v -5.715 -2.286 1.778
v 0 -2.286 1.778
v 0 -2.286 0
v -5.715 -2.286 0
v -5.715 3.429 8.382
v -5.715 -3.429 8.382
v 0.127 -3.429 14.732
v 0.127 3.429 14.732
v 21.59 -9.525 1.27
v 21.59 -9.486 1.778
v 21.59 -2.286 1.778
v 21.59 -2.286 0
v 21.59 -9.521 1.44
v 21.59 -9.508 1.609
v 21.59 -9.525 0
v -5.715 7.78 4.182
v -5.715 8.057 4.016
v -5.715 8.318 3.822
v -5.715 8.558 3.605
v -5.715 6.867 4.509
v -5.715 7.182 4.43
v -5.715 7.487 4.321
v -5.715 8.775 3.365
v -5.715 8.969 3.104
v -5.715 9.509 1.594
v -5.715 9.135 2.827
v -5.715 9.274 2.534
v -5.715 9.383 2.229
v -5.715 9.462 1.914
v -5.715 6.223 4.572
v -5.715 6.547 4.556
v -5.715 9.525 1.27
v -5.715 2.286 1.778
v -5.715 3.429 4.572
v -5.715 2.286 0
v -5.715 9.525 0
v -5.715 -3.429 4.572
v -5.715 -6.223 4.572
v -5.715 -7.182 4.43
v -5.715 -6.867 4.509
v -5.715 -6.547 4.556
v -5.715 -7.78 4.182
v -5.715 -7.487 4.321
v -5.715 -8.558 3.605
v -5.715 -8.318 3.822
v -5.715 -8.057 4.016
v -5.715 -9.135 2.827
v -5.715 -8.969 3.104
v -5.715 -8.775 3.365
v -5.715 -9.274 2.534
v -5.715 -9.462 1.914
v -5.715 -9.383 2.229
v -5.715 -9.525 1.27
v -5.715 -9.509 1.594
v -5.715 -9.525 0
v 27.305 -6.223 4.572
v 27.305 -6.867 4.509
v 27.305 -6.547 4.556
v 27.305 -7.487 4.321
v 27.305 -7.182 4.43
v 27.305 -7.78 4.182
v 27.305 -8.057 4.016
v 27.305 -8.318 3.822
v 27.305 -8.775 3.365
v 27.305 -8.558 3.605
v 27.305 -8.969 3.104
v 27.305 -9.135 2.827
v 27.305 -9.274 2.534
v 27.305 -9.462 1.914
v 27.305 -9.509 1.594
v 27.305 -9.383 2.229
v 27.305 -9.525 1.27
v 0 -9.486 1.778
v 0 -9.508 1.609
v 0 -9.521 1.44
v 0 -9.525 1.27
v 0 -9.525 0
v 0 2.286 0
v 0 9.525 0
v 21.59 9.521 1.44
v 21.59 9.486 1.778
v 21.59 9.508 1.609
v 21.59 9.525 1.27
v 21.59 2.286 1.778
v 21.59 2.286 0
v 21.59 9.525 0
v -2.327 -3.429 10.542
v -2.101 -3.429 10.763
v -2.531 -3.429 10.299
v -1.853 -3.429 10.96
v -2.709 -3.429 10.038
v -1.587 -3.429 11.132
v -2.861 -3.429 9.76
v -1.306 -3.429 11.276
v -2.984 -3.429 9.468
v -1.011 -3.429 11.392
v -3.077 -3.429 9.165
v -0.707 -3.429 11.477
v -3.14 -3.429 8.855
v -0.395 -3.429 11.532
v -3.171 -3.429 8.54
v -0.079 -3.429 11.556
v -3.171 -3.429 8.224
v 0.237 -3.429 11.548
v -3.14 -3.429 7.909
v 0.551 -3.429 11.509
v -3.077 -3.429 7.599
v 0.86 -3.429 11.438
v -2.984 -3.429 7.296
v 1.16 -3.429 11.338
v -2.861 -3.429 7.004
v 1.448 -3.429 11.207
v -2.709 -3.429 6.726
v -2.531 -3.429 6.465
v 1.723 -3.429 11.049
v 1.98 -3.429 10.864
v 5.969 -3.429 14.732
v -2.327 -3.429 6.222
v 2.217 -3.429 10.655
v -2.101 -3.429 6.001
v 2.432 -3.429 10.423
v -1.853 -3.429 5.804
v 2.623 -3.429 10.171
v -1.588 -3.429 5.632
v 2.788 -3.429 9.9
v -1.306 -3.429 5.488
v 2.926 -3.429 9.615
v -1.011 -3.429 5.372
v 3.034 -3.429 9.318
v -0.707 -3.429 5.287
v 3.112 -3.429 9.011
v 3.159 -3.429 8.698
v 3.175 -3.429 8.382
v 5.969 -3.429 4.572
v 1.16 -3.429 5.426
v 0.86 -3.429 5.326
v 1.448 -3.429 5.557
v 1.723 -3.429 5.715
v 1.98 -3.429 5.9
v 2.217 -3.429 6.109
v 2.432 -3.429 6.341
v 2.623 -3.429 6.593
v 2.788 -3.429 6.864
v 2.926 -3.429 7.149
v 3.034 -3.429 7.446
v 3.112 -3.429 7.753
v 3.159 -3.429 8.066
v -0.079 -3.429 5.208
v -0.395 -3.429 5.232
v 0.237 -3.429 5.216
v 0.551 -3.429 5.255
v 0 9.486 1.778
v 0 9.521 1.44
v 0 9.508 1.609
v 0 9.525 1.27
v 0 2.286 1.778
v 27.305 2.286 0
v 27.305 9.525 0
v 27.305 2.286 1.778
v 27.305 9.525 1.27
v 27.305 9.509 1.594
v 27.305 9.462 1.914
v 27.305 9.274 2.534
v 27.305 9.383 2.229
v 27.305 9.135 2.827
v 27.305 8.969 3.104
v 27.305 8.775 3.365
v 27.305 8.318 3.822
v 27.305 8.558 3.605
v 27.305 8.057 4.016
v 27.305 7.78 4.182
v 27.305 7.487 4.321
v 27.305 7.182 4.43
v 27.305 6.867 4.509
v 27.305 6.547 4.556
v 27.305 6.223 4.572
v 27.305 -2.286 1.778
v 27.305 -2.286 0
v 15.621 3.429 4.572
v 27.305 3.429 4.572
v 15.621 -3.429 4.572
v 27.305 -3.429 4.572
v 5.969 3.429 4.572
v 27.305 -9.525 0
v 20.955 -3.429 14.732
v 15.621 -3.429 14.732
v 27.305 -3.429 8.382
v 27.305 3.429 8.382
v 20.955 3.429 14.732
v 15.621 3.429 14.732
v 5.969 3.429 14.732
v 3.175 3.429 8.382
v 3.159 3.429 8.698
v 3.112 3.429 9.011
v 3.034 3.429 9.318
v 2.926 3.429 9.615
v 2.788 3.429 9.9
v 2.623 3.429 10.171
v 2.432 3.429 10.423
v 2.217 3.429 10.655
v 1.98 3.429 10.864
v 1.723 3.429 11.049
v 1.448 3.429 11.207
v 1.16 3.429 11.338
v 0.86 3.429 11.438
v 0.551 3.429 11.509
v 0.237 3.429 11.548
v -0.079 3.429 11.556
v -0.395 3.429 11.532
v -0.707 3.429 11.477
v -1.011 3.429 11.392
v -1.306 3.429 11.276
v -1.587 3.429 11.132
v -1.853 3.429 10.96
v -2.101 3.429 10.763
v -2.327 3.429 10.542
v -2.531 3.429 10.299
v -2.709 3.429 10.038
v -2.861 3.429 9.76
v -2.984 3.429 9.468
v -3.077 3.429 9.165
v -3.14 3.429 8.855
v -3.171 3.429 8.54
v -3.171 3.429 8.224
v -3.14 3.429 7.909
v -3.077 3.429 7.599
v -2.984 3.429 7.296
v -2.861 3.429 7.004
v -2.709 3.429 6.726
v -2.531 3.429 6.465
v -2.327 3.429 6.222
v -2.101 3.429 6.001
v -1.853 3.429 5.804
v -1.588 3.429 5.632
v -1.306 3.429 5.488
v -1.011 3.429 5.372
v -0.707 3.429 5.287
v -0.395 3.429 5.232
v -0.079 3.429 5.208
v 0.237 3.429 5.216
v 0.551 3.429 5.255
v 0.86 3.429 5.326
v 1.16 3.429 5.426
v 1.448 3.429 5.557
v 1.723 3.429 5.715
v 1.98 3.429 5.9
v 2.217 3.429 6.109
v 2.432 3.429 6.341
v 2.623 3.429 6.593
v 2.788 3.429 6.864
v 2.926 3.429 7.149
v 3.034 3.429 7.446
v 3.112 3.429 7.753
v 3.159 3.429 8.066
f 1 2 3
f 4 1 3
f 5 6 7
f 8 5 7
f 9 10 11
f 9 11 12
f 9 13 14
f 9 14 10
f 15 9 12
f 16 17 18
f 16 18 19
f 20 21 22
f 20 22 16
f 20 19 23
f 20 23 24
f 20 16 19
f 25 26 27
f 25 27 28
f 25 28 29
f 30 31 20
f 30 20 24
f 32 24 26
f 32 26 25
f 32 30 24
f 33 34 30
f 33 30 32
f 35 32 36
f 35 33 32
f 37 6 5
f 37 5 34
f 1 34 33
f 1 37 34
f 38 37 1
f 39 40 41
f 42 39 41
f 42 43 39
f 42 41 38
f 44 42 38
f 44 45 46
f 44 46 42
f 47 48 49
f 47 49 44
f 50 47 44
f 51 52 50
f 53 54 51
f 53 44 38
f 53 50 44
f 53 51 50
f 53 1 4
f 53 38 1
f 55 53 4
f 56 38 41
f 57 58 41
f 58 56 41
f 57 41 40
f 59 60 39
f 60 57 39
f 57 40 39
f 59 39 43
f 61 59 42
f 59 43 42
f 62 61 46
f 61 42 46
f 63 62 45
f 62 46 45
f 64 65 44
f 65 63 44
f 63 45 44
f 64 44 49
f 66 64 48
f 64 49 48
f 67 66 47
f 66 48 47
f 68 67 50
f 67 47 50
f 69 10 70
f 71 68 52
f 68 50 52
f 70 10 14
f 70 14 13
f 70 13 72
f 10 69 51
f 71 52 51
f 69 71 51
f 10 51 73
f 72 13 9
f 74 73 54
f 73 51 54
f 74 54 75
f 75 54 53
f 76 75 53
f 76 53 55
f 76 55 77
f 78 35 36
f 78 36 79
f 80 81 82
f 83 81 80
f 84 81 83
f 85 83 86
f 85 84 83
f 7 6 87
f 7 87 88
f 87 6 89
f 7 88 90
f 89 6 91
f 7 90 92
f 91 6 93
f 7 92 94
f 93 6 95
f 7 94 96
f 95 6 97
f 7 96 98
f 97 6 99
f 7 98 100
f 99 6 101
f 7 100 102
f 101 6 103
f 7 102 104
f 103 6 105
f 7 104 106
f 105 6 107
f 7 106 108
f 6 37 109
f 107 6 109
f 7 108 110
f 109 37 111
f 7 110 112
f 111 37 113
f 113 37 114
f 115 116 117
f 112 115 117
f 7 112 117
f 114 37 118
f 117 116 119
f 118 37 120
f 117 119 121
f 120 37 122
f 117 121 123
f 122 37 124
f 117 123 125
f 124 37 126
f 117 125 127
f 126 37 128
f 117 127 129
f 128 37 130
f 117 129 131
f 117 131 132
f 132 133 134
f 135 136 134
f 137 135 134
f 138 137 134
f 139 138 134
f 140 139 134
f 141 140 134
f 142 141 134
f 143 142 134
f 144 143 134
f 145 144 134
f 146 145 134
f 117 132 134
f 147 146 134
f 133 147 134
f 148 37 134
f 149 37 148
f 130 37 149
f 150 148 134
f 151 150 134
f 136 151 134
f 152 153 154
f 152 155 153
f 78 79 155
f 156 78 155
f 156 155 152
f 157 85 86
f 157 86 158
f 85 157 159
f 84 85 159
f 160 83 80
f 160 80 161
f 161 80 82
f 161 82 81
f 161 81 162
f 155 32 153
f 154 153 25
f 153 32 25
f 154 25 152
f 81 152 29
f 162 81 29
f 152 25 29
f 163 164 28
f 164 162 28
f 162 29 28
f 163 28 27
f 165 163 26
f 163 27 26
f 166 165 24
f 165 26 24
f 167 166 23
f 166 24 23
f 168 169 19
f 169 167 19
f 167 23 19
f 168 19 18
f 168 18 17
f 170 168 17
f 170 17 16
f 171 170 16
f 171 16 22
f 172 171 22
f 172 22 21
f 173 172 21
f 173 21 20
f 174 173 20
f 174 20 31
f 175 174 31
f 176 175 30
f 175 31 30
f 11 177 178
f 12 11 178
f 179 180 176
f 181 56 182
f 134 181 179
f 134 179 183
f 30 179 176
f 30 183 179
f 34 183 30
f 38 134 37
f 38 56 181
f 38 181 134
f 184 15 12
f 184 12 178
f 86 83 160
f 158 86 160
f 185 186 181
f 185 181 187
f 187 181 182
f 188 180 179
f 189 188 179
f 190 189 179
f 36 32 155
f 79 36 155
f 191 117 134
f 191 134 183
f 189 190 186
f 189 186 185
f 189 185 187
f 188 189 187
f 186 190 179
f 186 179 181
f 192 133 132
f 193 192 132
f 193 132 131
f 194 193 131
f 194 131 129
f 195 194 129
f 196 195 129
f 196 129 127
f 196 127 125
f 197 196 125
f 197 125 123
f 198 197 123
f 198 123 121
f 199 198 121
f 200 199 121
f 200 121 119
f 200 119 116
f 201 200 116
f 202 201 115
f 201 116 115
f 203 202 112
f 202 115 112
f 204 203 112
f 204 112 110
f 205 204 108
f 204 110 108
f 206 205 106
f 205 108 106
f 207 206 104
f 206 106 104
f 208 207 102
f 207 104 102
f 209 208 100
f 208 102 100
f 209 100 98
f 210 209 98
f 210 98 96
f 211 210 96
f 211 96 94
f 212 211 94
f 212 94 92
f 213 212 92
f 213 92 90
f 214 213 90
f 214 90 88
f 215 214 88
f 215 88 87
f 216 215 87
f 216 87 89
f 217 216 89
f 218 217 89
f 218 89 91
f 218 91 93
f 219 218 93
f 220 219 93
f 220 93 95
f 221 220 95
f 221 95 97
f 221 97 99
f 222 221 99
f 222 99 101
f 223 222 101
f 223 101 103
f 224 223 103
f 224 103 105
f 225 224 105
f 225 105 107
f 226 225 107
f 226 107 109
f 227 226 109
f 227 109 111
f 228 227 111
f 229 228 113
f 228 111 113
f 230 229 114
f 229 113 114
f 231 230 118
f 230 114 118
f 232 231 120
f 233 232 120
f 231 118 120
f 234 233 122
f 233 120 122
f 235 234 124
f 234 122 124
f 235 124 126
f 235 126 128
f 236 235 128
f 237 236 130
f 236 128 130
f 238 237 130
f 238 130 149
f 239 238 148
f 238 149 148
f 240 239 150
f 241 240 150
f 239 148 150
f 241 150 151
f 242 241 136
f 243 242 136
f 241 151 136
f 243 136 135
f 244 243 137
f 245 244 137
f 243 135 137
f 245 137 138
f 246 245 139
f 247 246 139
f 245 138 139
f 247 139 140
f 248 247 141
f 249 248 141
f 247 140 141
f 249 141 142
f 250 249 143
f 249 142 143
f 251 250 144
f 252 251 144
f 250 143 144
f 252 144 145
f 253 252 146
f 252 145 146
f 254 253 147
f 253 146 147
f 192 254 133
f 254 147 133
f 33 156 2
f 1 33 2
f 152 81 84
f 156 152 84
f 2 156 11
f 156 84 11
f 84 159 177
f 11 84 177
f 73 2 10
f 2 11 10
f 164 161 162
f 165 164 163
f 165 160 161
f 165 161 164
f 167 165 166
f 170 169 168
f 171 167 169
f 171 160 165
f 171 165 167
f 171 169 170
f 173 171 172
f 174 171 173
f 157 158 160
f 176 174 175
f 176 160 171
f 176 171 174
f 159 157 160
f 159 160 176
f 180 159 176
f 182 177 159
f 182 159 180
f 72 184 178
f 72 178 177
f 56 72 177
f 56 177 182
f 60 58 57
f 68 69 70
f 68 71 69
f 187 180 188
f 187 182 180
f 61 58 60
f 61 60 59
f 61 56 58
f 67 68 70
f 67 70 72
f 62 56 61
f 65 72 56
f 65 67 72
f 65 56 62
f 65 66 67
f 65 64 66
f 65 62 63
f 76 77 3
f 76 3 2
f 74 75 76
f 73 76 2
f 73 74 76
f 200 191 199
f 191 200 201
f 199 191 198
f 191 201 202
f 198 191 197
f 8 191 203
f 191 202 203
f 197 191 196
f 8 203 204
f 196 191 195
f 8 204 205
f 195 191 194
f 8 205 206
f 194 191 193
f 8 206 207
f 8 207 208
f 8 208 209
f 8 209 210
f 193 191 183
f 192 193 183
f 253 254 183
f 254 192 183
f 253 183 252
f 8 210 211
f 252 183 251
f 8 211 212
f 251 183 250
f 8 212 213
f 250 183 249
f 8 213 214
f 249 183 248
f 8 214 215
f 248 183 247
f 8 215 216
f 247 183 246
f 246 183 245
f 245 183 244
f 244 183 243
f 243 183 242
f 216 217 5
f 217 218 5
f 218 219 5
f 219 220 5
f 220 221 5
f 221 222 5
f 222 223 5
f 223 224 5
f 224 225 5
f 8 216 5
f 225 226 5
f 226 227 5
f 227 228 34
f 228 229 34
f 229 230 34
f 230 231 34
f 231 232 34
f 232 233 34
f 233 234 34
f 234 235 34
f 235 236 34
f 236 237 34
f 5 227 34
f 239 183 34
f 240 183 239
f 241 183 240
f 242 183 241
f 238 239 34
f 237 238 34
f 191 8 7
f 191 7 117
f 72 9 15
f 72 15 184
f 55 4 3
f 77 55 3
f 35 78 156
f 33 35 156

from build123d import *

# Parameters (mm, degrees)
F1_DEPTH    = 9.525
F3_DEPTH    = 33.02
F4_T1_DEPTH = 49.53
F6_DEPTH    = 10.16
F7_R        = 3.175
F8_DEPTH    = 25.4
F10_DEPTH   = 25.4


# Not quite as in the source:
# - a fillet or chamfer that OpenCascade refuses, or shapes differently, is made with other operations: its cross-section is extruded or revolved along the edge and cut away or added


with BuildPart() as f1:
    # F0 (on Front) → F1 (new body, symmetric)
    with BuildSketch(Plane.XZ):
        Polygon((-5.715, 0), (0, 0), (0, 1.778), (21.59, 1.778), (21.59, 0), (27.305, 0), (27.305, 4.572), (-5.715, 4.572), align=None)
    extrude(amount=F1_DEPTH, both=True)

    # F2 (on face) → F3 (cut)
    with BuildSketch(Plane.YZ.offset(27.305)):
        Polygon((-2.286, 0), (0, 0), (2.286, 0), (2.286, 1.778), (0, 1.778), (-2.286, 1.778), align=None)
    extrude(amount=-F3_DEPTH, mode=Mode.SUBTRACT)

    # F4: fillet of radius 3.302 on 2 edges, made by hand

    # F4_s2 → F4_t1 (cut)
    with BuildSketch(Plane.YZ.offset(-13.97)):
        with BuildLine():
            ThreePointArc((-6.223, 4.572), (-8.5578665915, 3.6048665915), (-9.525, 1.27))
            Line((-9.525, 1.27), (-9.525, 4.572))
            Line((-9.525, 4.572), (-6.223, 4.572))
        make_face()
        with BuildLine():
            ThreePointArc((9.525, 1.27), (8.5578665915, 3.6048665915), (6.223, 4.572))
            Line((6.223, 4.572), (9.525, 4.572))
            Line((9.525, 4.572), (9.525, 1.27))
        make_face()
    extrude(amount=F4_T1_DEPTH, mode=Mode.SUBTRACT)

    # F5 (on face) → F6 (join)
    with BuildSketch(Plane.XY.offset(4.572)):
        Polygon((-5.715, 3.429), (-5.715, 0), (-5.715, -3.429), (5.969, -3.429), (5.969, 3.429), align=None)
        Polygon((27.305, 0), (27.305, 3.429), (15.621, 3.429), (15.621, -3.429), (27.305, -3.429), align=None)
    extrude(amount=F6_DEPTH)

    # F7 (on face) → F8 (cut)
    with BuildSketch(Plane.XZ.offset(3.429)):
        Polygon((-5.715, 14.732), (-5.715, 8.382), (0.127, 14.732), align=None)
        with Locations((0, 8.382)):
            Circle(F7_R)
    extrude(amount=-F8_DEPTH, mode=Mode.SUBTRACT)

    # F9 (on face) → F10 (cut)
    with BuildSketch(Plane.XZ.offset(3.429)):
        Polygon((27.305, 14.732), (20.955, 14.732), (27.305, 8.382), align=None)
    extrude(amount=-F10_DEPTH, mode=Mode.SUBTRACT)


solid = f1.part
